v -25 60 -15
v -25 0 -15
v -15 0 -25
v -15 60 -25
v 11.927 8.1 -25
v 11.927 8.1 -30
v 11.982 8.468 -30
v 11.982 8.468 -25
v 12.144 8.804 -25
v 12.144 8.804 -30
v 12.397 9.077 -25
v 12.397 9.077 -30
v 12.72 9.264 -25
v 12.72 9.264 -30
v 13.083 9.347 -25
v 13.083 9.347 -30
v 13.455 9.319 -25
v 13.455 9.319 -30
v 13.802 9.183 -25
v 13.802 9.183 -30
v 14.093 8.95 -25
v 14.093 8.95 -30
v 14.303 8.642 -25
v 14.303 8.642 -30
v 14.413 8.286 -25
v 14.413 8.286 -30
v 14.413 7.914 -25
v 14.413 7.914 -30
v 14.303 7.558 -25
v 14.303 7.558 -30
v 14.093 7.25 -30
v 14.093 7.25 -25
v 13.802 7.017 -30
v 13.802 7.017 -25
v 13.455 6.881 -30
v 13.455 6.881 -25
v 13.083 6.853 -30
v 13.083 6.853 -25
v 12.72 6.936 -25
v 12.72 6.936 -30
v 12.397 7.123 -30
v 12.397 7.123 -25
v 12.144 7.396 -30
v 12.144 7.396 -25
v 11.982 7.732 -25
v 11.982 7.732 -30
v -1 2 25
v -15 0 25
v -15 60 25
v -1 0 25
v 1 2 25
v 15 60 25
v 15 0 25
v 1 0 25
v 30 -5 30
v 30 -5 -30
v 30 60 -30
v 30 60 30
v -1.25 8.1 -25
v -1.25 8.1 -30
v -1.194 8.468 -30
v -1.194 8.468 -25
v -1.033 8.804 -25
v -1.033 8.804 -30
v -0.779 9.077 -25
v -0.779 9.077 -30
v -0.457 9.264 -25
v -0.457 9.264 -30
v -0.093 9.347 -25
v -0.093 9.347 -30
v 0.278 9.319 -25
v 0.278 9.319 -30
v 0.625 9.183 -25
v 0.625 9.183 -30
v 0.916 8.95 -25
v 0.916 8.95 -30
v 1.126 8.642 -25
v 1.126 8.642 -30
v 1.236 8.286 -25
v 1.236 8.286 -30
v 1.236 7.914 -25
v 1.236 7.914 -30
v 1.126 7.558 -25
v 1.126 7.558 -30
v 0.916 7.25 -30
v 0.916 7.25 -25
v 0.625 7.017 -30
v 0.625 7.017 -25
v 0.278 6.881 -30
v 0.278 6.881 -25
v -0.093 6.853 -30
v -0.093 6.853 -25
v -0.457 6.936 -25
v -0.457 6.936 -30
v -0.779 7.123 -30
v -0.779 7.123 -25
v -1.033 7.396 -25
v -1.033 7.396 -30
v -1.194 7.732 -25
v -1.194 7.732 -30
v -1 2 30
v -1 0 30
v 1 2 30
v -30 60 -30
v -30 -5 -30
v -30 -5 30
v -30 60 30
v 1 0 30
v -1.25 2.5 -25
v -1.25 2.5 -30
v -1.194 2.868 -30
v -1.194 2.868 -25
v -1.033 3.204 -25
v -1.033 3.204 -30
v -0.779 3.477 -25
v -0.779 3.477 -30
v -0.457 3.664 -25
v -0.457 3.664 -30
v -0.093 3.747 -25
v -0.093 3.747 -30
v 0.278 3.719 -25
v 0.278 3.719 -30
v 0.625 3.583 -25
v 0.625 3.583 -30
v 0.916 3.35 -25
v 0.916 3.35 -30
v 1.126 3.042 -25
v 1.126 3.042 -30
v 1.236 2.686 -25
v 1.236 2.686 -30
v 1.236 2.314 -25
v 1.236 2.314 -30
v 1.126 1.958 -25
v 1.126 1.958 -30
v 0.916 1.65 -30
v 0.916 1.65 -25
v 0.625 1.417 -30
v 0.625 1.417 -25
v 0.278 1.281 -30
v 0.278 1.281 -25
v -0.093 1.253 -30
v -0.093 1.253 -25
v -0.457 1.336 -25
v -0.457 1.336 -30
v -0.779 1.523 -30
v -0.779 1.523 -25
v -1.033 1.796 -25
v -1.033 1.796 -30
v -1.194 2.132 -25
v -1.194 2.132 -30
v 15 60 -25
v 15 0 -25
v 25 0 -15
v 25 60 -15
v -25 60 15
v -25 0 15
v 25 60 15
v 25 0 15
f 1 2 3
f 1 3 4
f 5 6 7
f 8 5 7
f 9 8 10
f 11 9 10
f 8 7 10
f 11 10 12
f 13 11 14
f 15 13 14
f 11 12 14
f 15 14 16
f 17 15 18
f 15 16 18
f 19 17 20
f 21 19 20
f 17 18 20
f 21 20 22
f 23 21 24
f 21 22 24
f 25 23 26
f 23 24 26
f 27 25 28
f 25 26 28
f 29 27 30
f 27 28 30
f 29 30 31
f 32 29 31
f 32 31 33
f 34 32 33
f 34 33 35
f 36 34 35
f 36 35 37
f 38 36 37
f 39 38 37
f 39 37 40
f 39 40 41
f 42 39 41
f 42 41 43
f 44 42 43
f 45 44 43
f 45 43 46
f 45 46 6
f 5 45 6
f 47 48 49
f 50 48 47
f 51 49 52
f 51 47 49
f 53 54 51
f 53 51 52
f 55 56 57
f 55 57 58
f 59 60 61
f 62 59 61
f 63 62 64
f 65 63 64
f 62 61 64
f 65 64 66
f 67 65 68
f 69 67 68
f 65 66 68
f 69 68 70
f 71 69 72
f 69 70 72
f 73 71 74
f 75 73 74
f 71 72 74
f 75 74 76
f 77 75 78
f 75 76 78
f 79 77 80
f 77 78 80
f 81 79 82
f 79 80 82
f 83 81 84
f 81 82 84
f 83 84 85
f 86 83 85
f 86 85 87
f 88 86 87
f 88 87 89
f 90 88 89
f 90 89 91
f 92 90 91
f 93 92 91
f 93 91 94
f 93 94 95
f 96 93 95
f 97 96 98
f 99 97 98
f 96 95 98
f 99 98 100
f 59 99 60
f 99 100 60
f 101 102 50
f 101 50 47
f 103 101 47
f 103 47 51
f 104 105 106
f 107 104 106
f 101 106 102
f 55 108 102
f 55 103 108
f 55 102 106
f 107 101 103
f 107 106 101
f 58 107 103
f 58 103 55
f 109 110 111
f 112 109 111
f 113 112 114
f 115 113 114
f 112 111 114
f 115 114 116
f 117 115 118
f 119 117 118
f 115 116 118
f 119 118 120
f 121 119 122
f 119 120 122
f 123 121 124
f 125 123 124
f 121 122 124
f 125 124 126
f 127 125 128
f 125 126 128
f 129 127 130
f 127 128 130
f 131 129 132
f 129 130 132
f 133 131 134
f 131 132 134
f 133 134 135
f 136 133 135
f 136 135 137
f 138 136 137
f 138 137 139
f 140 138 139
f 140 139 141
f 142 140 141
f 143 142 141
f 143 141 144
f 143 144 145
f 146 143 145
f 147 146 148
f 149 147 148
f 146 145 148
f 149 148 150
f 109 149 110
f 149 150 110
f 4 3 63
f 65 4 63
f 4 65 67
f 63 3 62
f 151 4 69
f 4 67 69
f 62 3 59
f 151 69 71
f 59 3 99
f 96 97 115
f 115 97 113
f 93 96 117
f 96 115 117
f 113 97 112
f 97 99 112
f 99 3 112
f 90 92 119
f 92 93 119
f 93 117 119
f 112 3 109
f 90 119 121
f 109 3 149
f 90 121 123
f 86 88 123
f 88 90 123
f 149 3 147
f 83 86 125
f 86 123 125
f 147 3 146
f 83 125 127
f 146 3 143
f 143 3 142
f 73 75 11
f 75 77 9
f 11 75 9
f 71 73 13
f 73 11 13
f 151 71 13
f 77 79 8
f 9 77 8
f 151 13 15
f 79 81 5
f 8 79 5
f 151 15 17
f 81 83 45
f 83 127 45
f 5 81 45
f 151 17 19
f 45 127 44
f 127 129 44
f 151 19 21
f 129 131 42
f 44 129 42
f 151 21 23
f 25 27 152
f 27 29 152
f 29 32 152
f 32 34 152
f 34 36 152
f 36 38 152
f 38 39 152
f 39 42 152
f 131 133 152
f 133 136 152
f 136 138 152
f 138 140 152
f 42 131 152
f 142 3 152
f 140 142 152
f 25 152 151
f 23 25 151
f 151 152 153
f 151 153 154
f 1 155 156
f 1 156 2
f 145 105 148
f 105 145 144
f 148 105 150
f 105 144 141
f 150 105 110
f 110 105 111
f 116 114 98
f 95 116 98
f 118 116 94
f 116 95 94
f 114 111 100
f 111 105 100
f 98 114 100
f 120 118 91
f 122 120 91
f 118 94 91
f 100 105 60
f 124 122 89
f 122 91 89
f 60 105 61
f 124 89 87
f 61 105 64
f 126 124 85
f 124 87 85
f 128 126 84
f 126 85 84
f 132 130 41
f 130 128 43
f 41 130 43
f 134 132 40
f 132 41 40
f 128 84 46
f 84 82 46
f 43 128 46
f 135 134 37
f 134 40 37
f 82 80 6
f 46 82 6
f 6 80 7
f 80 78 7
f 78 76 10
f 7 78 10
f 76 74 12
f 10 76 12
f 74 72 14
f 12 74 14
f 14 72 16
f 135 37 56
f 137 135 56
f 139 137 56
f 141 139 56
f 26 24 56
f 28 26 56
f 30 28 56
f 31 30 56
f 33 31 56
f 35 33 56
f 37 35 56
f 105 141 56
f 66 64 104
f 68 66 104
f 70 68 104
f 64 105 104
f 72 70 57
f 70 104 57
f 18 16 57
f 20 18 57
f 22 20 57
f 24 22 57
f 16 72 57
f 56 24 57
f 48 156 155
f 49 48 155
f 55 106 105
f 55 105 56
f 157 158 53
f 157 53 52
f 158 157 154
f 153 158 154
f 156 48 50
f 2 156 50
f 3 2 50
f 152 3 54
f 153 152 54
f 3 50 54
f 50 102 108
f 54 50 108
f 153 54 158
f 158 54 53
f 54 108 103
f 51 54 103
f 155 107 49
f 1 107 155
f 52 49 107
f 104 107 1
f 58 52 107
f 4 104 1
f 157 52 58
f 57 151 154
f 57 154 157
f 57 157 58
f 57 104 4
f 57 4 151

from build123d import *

# Parameters (mm, degrees)
SKETCH1_W           = 60
SKETCH1_H           = 60
SKETCH1_W_2         = 50
SKETCH1_H_2         = 50
BOSS_EXTRUDE1_DEPTH = 60
SKETCH2_W           = 60
SKETCH2_H           = 60
BOSS_EXTRUDE2_DEPTH = 5
SKETCH3_R           = 1.25
CUT_EXTRUDE1_DEPTH  = 5
CUT_EXTRUDE2_REACH  = 62
SKETCH4_R           = 1.25
CHAMFER1_SIZE       = 10
CUT_EXTRUDE4_REACH  = 62
SKETCH6_W           = 2
SKETCH6_H           = 2


with BuildPart() as part:
    # Sketch1 → Boss-Extrude1 (new body)
    with BuildSketch(Plane(origin=(0, 0, 0), x_dir=(1, 0, 0), z_dir=(0, 1, 0))):
        Rectangle(SKETCH1_W, SKETCH1_H)
        Rectangle(SKETCH1_W_2, SKETCH1_H_2, mode=Mode.SUBTRACT)
    extrude(amount=BOSS_EXTRUDE1_DEPTH)

    # Sketch2 → Boss-Extrude2 (add)
    with BuildSketch(Plane.XZ):
        Rectangle(SKETCH2_W, SKETCH2_H)
    extrude(amount=BOSS_EXTRUDE2_DEPTH)

    # Sketch3 → Cut-Extrude1 (cut)
    with BuildSketch(Plane(origin=(0, 0, -30), x_dir=(-1, 0, 0), z_dir=(0, 0, -1))):
        with Locations((0, 2.5)):
            Circle(SKETCH3_R)
        with Locations((0, 8.1)):
            Circle(SKETCH3_R)
    extrude(amount=-CUT_EXTRUDE1_DEPTH, mode=Mode.SUBTRACT)

    # Sketch4 → Cut-Extrude2 (cut, up to next)
    with BuildSketch(Plane(origin=(0, 0, -30), x_dir=(-1, 0, 0), z_dir=(0, 0, -1)), mode=Mode.PRIVATE) as cut_extrude2_sk1:
        with Locations((-13.176528006, 8.1)):
            Circle(SKETCH4_R)
    cut_extrude2_tool1 = extrude(cut_extrude2_sk1.sketch, amount=-CUT_EXTRUDE2_REACH, mode=Mode.PRIVATE) & part.part
    add(cut_extrude2_tool1.solids().sort_by_distance((13.176528, 8.1, -30))[0], mode=Mode.SUBTRACT)

    # Chamfer1
    chamfer1_edges = [part.edges().sort_by_distance(p)[0] for p in [
        (25, 30, 25),
        (25, 30, -25),
        (-25, 30, -25),
        (-25, 30, 25),
    ]]
    chamfer(chamfer1_edges, length=CHAMFER1_SIZE)

    # Sketch6 → Cut-Extrude4 (cut, up to next)
    with BuildSketch(Plane.XY.offset(30), mode=Mode.PRIVATE) as cut_extrude4_sk1:
        with Locations((0, 1)):
            Rectangle(SKETCH6_W, SKETCH6_H)
    cut_extrude4_tool1 = extrude(cut_extrude4_sk1.sketch, amount=-CUT_EXTRUDE4_REACH, mode=Mode.PRIVATE) & part.part
    add(cut_extrude4_tool1.solids().sort_by_distance((0, 1, 30))[0], mode=Mode.SUBTRACT)


solid = part.part
